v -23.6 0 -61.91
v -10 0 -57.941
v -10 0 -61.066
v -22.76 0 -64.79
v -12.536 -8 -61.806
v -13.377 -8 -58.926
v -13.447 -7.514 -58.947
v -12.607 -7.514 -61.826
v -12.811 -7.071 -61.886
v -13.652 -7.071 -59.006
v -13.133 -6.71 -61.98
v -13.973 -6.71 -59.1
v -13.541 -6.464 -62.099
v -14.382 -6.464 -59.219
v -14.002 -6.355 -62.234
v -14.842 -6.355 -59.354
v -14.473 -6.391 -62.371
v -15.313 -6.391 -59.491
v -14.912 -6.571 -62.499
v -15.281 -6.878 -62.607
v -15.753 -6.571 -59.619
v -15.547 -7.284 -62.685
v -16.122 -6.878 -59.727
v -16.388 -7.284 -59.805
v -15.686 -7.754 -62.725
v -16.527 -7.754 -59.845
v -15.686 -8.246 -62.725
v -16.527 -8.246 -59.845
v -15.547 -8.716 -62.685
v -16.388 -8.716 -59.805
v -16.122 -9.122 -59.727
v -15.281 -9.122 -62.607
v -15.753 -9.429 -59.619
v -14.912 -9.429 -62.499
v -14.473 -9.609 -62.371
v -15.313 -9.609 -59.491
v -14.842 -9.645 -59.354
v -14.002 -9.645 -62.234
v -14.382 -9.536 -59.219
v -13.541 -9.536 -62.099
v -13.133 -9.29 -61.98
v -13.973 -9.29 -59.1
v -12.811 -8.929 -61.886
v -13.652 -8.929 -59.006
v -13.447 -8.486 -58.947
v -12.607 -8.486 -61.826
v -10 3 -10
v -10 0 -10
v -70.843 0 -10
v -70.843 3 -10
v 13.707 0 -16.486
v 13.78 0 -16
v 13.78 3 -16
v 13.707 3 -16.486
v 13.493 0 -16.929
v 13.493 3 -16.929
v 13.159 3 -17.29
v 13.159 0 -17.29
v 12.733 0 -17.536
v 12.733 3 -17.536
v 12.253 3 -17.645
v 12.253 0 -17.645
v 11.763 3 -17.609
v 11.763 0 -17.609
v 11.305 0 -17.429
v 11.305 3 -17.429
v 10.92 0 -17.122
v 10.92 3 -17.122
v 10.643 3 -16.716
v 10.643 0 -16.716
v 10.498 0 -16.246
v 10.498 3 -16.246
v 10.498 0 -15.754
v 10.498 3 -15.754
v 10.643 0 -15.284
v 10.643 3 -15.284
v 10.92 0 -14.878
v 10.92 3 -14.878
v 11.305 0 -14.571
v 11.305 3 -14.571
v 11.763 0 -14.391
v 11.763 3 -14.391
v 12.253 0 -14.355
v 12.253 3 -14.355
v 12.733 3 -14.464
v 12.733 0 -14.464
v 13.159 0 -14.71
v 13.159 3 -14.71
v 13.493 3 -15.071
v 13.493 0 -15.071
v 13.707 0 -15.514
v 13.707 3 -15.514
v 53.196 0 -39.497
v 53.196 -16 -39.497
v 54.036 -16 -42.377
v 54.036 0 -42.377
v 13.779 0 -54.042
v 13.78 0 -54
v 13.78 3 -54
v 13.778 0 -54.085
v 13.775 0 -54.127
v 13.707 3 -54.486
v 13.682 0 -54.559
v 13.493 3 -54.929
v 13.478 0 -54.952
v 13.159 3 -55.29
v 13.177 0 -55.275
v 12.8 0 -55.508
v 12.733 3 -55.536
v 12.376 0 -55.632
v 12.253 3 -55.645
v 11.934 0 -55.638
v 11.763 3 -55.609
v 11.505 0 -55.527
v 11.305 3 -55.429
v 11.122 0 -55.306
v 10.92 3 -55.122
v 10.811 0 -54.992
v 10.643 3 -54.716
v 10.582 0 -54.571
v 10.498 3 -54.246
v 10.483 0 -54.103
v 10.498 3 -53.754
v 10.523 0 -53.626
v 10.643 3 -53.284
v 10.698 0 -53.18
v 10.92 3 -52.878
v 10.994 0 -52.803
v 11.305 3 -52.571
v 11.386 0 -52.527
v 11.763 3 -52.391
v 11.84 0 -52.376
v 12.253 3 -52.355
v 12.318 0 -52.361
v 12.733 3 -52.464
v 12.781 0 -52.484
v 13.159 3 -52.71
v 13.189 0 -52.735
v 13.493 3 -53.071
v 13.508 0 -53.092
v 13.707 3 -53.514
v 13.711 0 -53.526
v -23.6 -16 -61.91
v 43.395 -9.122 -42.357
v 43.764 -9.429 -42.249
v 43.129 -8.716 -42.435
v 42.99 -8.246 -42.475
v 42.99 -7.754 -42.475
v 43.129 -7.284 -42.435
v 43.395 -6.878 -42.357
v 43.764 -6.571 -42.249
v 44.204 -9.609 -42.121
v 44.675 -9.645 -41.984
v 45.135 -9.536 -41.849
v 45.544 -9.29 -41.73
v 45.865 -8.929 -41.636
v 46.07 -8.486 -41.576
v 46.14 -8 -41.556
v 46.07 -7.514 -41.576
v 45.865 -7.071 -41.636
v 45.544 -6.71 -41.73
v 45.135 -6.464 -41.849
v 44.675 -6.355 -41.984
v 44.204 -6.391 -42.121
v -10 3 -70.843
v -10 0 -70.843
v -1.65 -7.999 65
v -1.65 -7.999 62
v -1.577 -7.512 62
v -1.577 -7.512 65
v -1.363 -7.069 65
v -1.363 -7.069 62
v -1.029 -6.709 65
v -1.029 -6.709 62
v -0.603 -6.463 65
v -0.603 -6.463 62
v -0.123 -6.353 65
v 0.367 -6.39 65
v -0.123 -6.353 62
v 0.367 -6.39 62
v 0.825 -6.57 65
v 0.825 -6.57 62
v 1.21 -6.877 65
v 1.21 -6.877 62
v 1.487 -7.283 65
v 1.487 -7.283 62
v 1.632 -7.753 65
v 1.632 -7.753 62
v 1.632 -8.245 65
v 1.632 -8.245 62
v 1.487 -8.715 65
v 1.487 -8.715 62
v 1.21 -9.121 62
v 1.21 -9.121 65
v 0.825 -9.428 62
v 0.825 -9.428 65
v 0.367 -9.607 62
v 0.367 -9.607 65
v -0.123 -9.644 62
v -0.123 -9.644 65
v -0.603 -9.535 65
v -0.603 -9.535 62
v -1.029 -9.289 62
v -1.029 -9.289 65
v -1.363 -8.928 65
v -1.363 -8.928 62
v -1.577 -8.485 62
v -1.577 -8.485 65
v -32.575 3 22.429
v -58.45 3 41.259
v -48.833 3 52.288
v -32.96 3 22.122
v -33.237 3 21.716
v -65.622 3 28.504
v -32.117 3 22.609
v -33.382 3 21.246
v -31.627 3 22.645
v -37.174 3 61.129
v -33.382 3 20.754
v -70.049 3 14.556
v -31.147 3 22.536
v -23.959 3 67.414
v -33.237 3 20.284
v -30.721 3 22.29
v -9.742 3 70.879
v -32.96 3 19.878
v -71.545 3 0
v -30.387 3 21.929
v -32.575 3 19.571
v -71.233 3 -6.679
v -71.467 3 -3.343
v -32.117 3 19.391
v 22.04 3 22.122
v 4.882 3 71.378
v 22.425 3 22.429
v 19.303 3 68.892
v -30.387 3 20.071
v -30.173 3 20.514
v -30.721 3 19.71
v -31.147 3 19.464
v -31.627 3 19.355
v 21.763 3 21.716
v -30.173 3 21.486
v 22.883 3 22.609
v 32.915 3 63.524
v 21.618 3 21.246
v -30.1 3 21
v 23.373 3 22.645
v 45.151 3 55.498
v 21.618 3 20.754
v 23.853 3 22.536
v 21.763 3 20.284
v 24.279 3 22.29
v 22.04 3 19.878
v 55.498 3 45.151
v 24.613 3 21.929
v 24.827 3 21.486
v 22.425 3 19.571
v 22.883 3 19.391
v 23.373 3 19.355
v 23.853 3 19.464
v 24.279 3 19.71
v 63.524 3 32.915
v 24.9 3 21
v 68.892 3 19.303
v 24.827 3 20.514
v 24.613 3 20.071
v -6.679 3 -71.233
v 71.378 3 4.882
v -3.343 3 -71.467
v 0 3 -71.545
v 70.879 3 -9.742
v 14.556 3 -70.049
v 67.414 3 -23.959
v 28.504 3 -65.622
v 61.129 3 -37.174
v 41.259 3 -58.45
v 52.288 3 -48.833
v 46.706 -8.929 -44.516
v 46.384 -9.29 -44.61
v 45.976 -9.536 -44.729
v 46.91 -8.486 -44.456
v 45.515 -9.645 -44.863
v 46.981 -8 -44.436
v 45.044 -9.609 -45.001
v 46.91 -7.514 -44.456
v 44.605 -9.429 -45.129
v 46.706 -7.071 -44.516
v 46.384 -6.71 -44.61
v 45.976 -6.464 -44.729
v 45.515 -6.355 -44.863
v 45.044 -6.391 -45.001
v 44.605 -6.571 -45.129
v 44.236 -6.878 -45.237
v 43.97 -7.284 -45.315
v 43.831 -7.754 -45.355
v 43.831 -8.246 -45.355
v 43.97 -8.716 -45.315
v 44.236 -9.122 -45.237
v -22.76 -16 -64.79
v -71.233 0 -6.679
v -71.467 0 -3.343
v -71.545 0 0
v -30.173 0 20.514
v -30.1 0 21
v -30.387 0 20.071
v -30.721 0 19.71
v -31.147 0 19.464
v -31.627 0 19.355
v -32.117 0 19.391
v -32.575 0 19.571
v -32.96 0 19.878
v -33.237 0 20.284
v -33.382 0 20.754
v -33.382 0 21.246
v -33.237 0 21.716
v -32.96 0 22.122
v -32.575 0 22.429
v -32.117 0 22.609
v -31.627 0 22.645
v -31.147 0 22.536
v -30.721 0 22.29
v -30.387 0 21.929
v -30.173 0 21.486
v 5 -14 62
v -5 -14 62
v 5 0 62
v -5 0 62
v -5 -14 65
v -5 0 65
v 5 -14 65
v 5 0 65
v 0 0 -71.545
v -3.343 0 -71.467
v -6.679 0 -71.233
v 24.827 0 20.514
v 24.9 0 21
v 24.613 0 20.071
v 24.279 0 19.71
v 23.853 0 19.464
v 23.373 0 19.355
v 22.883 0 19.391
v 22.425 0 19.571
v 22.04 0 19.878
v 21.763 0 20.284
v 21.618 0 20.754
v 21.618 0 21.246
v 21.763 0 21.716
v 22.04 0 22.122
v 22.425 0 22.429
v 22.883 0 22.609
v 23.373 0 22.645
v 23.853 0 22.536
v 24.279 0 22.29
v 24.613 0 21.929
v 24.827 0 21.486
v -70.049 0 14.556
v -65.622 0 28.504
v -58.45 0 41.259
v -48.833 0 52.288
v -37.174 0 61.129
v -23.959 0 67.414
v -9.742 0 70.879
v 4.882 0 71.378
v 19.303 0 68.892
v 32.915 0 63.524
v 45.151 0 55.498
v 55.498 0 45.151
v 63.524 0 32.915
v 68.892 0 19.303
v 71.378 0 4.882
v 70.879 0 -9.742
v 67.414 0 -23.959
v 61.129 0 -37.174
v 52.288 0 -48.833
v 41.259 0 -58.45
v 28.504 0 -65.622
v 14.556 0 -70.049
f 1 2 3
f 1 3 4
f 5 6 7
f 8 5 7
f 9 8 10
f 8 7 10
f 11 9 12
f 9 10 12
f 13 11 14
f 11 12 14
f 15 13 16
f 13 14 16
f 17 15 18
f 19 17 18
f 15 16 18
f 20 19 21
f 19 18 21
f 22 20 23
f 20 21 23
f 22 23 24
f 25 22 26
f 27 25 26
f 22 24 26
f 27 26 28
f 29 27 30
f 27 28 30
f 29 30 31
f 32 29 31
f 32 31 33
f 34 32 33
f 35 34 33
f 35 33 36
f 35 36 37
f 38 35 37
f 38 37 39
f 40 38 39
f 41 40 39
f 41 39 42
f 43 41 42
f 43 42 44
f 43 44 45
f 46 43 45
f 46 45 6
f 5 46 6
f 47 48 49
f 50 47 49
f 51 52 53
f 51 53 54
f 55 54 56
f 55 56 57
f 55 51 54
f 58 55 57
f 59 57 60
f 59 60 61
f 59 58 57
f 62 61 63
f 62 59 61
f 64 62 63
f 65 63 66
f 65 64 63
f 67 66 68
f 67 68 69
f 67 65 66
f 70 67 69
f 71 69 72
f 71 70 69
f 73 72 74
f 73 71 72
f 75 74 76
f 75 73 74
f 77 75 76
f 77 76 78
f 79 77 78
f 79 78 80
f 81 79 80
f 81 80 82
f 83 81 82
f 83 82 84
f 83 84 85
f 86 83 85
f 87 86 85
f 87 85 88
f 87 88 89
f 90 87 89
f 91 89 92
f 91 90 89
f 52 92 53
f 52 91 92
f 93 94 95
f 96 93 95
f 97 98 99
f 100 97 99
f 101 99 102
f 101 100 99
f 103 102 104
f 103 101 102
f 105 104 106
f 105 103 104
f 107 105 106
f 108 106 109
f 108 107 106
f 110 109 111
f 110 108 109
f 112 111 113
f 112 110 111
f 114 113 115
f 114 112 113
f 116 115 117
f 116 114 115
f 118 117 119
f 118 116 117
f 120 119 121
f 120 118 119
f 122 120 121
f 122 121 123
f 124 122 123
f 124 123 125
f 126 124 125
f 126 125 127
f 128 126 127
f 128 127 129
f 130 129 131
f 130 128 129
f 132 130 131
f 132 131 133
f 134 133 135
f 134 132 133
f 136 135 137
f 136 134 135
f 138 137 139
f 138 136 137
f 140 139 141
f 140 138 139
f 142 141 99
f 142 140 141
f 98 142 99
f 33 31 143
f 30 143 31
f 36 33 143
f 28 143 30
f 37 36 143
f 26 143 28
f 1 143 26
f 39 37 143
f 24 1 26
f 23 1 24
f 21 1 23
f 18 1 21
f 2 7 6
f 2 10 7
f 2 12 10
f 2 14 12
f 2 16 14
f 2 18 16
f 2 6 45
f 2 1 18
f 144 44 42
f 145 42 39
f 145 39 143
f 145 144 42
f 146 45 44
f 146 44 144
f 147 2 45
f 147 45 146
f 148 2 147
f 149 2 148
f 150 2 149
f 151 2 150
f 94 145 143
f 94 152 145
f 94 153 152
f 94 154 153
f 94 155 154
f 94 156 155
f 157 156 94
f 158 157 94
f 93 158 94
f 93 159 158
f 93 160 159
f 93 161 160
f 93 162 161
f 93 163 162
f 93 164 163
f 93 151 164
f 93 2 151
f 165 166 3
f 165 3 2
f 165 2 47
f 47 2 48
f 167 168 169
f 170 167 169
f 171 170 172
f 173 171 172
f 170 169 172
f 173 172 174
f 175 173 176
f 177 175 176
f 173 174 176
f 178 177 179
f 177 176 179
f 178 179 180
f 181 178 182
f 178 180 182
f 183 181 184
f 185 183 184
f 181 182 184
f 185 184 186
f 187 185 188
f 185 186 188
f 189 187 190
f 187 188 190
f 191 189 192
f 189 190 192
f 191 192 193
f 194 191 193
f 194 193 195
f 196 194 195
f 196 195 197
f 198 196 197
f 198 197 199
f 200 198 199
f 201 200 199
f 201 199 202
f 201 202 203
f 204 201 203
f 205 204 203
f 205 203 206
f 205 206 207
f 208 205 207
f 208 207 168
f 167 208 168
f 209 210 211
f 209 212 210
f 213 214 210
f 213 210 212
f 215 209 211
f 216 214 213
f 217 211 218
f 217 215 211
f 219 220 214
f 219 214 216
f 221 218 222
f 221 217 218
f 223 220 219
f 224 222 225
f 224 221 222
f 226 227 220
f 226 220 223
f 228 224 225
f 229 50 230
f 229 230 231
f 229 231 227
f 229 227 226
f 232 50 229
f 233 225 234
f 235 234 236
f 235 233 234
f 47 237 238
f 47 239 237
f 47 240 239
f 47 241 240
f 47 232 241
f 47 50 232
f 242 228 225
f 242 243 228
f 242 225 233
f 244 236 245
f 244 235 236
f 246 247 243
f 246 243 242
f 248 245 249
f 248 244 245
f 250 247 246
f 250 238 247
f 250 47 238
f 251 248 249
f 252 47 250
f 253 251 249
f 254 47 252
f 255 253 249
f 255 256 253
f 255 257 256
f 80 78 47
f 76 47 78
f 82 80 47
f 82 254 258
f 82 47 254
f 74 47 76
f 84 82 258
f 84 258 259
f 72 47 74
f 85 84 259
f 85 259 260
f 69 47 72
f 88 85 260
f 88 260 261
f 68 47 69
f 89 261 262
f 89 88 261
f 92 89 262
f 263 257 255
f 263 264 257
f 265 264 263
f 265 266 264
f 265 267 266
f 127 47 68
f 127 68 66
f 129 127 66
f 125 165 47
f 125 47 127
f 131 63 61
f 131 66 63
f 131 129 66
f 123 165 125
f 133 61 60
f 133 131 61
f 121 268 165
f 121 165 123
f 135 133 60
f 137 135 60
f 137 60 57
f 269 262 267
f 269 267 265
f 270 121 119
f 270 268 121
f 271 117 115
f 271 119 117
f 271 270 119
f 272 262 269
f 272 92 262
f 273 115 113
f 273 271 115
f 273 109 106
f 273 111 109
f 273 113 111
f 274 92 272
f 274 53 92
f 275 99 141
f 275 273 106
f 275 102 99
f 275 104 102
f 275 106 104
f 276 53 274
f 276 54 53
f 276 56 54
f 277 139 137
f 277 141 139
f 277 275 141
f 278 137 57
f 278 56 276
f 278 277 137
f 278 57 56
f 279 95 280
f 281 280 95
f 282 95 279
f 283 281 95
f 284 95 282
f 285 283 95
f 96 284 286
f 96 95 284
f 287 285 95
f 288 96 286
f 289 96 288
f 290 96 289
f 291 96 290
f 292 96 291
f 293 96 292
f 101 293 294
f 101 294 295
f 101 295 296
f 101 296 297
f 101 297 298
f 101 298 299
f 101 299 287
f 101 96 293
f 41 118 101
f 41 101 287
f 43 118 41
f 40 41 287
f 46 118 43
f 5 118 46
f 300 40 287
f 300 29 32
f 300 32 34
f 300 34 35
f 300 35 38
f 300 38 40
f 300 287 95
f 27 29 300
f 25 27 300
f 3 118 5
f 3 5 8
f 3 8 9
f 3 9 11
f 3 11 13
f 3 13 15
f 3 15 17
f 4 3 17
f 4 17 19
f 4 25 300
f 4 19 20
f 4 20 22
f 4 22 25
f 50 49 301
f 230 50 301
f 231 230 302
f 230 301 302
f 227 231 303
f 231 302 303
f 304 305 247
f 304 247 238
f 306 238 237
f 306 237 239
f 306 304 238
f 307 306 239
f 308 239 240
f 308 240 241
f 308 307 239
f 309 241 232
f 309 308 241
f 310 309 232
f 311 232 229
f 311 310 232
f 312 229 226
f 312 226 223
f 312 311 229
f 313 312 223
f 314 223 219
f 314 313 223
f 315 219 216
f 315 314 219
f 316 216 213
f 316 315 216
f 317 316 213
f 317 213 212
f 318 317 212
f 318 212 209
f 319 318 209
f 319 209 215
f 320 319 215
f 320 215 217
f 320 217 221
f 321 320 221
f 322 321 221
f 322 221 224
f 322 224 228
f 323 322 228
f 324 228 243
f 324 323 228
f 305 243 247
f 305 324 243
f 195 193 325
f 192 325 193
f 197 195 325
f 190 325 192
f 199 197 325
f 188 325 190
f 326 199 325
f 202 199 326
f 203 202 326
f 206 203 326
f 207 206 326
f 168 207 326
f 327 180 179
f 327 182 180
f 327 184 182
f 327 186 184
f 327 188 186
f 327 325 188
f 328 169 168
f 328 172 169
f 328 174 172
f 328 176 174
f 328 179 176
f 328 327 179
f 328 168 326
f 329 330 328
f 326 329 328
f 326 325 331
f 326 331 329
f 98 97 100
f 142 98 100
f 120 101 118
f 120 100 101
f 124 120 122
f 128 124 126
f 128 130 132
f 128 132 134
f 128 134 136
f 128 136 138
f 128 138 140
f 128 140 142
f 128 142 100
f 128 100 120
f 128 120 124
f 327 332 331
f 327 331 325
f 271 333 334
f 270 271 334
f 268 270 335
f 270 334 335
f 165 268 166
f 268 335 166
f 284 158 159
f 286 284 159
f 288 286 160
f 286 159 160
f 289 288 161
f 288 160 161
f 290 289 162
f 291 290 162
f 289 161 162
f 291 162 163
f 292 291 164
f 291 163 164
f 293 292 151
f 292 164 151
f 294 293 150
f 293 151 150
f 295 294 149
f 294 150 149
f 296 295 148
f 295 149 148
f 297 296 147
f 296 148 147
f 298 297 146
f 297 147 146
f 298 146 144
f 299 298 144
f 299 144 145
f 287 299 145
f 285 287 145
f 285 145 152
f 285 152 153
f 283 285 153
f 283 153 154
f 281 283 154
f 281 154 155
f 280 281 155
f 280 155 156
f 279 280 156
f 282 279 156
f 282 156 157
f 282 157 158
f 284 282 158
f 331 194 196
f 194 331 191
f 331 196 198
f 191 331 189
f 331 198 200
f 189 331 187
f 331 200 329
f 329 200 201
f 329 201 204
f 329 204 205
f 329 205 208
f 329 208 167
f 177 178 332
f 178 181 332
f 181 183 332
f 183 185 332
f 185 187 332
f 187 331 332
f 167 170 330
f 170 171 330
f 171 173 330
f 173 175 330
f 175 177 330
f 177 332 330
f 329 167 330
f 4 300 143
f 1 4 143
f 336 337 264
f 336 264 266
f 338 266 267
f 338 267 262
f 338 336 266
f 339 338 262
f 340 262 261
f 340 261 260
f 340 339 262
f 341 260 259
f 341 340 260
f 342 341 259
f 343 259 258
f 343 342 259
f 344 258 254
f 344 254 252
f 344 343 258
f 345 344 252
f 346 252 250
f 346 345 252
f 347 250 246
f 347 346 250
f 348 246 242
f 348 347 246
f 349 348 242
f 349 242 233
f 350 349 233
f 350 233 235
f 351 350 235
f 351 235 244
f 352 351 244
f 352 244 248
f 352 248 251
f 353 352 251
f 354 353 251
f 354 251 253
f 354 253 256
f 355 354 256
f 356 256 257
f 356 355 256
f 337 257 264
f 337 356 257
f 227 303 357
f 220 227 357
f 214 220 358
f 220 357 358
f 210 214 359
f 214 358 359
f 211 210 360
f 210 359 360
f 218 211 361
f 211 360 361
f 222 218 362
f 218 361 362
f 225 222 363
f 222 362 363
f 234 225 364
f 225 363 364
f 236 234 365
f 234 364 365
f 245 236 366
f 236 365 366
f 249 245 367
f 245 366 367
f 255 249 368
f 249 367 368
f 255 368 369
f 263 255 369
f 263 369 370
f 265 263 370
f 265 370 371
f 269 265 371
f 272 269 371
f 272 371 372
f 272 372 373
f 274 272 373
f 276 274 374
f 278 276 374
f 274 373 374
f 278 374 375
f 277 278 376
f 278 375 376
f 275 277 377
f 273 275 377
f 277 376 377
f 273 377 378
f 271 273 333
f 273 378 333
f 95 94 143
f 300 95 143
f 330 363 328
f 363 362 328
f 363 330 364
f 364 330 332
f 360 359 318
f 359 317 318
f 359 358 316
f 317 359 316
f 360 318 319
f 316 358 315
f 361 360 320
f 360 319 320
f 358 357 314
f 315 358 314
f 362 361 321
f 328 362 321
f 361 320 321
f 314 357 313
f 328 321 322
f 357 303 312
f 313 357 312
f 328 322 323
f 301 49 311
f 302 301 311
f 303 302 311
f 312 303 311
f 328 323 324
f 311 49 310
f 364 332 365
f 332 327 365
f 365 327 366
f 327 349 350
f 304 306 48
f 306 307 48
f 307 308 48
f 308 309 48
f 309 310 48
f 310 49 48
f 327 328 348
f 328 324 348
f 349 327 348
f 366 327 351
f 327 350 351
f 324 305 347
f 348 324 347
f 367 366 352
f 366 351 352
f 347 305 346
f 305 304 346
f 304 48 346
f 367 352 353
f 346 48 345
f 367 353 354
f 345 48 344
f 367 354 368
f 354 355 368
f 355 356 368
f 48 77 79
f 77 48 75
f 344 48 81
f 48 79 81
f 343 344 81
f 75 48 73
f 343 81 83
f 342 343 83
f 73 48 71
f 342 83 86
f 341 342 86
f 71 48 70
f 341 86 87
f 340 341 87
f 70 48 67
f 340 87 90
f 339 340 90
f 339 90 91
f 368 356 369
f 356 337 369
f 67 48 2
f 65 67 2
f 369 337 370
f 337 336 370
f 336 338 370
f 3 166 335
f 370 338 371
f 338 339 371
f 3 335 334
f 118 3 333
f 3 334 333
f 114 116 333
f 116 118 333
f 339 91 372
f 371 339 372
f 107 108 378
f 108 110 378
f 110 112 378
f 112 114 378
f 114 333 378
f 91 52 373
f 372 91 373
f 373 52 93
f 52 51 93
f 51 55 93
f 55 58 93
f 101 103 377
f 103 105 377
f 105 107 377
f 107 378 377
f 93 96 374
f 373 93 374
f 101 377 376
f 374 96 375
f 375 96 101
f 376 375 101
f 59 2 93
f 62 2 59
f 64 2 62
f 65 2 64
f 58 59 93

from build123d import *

# Parameters (mm, degrees)
SKETCH1_R           = 1.65
BOSS_EXTRUDE1_DEPTH = 3
BOSS_EXTRUDE2_DEPTH = 16
SKETCH3_R           = 1.65
CUT_EXTRUDE1_DEPTH  = 16
SKETCH5_W           = 10
SKETCH5_H           = 3
BOSS_EXTRUDE3_DEPTH = 14
SKETCH6_R           = 1.65
CUT_EXTRUDE2_DEPTH  = 14


with BuildPart() as part:
    # Sketch1 → Boss-Extrude1 (new body)
    with BuildSketch(Plane(origin=(0, 0, 0), x_dir=(1, 0, 0), z_dir=(0, 1, 0))):
        with BuildLine():
            Line((-10, 70.842692107), (-10, 10))
            Line((-10, 10), (-70.842692107, 10))
            ThreePointArc((-70.842692107, 10), (-71.369207057, 5.012315742), (-71.545, 0))
            ThreePointArc((-71.545, 0), (50.58995466, -50.58995466), (0, 71.545))
            ThreePointArc((0, 71.545), (-5.012315742, 71.369207057), (-10, 70.842692107))
        make_face()
        with Locations((12.13, 16)):
            Circle(SKETCH1_R, mode=Mode.SUBTRACT)
        with Locations((12.13, 54)):
            Circle(SKETCH1_R, mode=Mode.SUBTRACT)
        with Locations((23.25, -21)):
            Circle(SKETCH1_R, mode=Mode.SUBTRACT)
        with Locations((-31.75, -21)):
            Circle(SKETCH1_R, mode=Mode.SUBTRACT)
    extrude(amount=BOSS_EXTRUDE1_DEPTH)

    # Sketch2 → Boss-Extrude2 (add)
    with BuildSketch(Plane.XZ):
        Polygon((-23.600230141, -61.909816502), (53.19593923, -39.496687094), (54.036431583, -42.376543445), (-22.759737789, -64.789672853), align=None)
    extrude(amount=BOSS_EXTRUDE2_DEPTH)

    # Sketch3 → Cut-Extrude1 (cut)
    with BuildSketch(Plane(origin=(14.797854544, 0, -50.703251798), x_dir=(0.959952117, 0, 0.280164118), z_dir=(-0.280164118, 0, 0.959952117))):
        with Locations((-31, -8)):
            Circle(SKETCH3_R)
        with Locations((31, -8)):
            Circle(SKETCH3_R)
    extrude(amount=-CUT_EXTRUDE1_DEPTH, mode=Mode.SUBTRACT)

    # Sketch5 → Boss-Extrude3 (add)
    with BuildSketch(Plane(origin=(0, 0, 0), x_dir=(-1, 0, 0), z_dir=(0, -1, 0))):
        with Locations((0, -63.5)):
            Rectangle(SKETCH5_W, SKETCH5_H)
    extrude(amount=BOSS_EXTRUDE3_DEPTH)

    # Sketch6 → Cut-Extrude2 (cut)
    with BuildSketch(Plane(origin=(0, 0, 62), x_dir=(-1, 0, 0), z_dir=(0, 0, -1))):
        with Locations((0, -7.998816604)):
            Circle(SKETCH6_R)
    extrude(amount=-CUT_EXTRUDE2_DEPTH, mode=Mode.SUBTRACT)


solid = part.part
